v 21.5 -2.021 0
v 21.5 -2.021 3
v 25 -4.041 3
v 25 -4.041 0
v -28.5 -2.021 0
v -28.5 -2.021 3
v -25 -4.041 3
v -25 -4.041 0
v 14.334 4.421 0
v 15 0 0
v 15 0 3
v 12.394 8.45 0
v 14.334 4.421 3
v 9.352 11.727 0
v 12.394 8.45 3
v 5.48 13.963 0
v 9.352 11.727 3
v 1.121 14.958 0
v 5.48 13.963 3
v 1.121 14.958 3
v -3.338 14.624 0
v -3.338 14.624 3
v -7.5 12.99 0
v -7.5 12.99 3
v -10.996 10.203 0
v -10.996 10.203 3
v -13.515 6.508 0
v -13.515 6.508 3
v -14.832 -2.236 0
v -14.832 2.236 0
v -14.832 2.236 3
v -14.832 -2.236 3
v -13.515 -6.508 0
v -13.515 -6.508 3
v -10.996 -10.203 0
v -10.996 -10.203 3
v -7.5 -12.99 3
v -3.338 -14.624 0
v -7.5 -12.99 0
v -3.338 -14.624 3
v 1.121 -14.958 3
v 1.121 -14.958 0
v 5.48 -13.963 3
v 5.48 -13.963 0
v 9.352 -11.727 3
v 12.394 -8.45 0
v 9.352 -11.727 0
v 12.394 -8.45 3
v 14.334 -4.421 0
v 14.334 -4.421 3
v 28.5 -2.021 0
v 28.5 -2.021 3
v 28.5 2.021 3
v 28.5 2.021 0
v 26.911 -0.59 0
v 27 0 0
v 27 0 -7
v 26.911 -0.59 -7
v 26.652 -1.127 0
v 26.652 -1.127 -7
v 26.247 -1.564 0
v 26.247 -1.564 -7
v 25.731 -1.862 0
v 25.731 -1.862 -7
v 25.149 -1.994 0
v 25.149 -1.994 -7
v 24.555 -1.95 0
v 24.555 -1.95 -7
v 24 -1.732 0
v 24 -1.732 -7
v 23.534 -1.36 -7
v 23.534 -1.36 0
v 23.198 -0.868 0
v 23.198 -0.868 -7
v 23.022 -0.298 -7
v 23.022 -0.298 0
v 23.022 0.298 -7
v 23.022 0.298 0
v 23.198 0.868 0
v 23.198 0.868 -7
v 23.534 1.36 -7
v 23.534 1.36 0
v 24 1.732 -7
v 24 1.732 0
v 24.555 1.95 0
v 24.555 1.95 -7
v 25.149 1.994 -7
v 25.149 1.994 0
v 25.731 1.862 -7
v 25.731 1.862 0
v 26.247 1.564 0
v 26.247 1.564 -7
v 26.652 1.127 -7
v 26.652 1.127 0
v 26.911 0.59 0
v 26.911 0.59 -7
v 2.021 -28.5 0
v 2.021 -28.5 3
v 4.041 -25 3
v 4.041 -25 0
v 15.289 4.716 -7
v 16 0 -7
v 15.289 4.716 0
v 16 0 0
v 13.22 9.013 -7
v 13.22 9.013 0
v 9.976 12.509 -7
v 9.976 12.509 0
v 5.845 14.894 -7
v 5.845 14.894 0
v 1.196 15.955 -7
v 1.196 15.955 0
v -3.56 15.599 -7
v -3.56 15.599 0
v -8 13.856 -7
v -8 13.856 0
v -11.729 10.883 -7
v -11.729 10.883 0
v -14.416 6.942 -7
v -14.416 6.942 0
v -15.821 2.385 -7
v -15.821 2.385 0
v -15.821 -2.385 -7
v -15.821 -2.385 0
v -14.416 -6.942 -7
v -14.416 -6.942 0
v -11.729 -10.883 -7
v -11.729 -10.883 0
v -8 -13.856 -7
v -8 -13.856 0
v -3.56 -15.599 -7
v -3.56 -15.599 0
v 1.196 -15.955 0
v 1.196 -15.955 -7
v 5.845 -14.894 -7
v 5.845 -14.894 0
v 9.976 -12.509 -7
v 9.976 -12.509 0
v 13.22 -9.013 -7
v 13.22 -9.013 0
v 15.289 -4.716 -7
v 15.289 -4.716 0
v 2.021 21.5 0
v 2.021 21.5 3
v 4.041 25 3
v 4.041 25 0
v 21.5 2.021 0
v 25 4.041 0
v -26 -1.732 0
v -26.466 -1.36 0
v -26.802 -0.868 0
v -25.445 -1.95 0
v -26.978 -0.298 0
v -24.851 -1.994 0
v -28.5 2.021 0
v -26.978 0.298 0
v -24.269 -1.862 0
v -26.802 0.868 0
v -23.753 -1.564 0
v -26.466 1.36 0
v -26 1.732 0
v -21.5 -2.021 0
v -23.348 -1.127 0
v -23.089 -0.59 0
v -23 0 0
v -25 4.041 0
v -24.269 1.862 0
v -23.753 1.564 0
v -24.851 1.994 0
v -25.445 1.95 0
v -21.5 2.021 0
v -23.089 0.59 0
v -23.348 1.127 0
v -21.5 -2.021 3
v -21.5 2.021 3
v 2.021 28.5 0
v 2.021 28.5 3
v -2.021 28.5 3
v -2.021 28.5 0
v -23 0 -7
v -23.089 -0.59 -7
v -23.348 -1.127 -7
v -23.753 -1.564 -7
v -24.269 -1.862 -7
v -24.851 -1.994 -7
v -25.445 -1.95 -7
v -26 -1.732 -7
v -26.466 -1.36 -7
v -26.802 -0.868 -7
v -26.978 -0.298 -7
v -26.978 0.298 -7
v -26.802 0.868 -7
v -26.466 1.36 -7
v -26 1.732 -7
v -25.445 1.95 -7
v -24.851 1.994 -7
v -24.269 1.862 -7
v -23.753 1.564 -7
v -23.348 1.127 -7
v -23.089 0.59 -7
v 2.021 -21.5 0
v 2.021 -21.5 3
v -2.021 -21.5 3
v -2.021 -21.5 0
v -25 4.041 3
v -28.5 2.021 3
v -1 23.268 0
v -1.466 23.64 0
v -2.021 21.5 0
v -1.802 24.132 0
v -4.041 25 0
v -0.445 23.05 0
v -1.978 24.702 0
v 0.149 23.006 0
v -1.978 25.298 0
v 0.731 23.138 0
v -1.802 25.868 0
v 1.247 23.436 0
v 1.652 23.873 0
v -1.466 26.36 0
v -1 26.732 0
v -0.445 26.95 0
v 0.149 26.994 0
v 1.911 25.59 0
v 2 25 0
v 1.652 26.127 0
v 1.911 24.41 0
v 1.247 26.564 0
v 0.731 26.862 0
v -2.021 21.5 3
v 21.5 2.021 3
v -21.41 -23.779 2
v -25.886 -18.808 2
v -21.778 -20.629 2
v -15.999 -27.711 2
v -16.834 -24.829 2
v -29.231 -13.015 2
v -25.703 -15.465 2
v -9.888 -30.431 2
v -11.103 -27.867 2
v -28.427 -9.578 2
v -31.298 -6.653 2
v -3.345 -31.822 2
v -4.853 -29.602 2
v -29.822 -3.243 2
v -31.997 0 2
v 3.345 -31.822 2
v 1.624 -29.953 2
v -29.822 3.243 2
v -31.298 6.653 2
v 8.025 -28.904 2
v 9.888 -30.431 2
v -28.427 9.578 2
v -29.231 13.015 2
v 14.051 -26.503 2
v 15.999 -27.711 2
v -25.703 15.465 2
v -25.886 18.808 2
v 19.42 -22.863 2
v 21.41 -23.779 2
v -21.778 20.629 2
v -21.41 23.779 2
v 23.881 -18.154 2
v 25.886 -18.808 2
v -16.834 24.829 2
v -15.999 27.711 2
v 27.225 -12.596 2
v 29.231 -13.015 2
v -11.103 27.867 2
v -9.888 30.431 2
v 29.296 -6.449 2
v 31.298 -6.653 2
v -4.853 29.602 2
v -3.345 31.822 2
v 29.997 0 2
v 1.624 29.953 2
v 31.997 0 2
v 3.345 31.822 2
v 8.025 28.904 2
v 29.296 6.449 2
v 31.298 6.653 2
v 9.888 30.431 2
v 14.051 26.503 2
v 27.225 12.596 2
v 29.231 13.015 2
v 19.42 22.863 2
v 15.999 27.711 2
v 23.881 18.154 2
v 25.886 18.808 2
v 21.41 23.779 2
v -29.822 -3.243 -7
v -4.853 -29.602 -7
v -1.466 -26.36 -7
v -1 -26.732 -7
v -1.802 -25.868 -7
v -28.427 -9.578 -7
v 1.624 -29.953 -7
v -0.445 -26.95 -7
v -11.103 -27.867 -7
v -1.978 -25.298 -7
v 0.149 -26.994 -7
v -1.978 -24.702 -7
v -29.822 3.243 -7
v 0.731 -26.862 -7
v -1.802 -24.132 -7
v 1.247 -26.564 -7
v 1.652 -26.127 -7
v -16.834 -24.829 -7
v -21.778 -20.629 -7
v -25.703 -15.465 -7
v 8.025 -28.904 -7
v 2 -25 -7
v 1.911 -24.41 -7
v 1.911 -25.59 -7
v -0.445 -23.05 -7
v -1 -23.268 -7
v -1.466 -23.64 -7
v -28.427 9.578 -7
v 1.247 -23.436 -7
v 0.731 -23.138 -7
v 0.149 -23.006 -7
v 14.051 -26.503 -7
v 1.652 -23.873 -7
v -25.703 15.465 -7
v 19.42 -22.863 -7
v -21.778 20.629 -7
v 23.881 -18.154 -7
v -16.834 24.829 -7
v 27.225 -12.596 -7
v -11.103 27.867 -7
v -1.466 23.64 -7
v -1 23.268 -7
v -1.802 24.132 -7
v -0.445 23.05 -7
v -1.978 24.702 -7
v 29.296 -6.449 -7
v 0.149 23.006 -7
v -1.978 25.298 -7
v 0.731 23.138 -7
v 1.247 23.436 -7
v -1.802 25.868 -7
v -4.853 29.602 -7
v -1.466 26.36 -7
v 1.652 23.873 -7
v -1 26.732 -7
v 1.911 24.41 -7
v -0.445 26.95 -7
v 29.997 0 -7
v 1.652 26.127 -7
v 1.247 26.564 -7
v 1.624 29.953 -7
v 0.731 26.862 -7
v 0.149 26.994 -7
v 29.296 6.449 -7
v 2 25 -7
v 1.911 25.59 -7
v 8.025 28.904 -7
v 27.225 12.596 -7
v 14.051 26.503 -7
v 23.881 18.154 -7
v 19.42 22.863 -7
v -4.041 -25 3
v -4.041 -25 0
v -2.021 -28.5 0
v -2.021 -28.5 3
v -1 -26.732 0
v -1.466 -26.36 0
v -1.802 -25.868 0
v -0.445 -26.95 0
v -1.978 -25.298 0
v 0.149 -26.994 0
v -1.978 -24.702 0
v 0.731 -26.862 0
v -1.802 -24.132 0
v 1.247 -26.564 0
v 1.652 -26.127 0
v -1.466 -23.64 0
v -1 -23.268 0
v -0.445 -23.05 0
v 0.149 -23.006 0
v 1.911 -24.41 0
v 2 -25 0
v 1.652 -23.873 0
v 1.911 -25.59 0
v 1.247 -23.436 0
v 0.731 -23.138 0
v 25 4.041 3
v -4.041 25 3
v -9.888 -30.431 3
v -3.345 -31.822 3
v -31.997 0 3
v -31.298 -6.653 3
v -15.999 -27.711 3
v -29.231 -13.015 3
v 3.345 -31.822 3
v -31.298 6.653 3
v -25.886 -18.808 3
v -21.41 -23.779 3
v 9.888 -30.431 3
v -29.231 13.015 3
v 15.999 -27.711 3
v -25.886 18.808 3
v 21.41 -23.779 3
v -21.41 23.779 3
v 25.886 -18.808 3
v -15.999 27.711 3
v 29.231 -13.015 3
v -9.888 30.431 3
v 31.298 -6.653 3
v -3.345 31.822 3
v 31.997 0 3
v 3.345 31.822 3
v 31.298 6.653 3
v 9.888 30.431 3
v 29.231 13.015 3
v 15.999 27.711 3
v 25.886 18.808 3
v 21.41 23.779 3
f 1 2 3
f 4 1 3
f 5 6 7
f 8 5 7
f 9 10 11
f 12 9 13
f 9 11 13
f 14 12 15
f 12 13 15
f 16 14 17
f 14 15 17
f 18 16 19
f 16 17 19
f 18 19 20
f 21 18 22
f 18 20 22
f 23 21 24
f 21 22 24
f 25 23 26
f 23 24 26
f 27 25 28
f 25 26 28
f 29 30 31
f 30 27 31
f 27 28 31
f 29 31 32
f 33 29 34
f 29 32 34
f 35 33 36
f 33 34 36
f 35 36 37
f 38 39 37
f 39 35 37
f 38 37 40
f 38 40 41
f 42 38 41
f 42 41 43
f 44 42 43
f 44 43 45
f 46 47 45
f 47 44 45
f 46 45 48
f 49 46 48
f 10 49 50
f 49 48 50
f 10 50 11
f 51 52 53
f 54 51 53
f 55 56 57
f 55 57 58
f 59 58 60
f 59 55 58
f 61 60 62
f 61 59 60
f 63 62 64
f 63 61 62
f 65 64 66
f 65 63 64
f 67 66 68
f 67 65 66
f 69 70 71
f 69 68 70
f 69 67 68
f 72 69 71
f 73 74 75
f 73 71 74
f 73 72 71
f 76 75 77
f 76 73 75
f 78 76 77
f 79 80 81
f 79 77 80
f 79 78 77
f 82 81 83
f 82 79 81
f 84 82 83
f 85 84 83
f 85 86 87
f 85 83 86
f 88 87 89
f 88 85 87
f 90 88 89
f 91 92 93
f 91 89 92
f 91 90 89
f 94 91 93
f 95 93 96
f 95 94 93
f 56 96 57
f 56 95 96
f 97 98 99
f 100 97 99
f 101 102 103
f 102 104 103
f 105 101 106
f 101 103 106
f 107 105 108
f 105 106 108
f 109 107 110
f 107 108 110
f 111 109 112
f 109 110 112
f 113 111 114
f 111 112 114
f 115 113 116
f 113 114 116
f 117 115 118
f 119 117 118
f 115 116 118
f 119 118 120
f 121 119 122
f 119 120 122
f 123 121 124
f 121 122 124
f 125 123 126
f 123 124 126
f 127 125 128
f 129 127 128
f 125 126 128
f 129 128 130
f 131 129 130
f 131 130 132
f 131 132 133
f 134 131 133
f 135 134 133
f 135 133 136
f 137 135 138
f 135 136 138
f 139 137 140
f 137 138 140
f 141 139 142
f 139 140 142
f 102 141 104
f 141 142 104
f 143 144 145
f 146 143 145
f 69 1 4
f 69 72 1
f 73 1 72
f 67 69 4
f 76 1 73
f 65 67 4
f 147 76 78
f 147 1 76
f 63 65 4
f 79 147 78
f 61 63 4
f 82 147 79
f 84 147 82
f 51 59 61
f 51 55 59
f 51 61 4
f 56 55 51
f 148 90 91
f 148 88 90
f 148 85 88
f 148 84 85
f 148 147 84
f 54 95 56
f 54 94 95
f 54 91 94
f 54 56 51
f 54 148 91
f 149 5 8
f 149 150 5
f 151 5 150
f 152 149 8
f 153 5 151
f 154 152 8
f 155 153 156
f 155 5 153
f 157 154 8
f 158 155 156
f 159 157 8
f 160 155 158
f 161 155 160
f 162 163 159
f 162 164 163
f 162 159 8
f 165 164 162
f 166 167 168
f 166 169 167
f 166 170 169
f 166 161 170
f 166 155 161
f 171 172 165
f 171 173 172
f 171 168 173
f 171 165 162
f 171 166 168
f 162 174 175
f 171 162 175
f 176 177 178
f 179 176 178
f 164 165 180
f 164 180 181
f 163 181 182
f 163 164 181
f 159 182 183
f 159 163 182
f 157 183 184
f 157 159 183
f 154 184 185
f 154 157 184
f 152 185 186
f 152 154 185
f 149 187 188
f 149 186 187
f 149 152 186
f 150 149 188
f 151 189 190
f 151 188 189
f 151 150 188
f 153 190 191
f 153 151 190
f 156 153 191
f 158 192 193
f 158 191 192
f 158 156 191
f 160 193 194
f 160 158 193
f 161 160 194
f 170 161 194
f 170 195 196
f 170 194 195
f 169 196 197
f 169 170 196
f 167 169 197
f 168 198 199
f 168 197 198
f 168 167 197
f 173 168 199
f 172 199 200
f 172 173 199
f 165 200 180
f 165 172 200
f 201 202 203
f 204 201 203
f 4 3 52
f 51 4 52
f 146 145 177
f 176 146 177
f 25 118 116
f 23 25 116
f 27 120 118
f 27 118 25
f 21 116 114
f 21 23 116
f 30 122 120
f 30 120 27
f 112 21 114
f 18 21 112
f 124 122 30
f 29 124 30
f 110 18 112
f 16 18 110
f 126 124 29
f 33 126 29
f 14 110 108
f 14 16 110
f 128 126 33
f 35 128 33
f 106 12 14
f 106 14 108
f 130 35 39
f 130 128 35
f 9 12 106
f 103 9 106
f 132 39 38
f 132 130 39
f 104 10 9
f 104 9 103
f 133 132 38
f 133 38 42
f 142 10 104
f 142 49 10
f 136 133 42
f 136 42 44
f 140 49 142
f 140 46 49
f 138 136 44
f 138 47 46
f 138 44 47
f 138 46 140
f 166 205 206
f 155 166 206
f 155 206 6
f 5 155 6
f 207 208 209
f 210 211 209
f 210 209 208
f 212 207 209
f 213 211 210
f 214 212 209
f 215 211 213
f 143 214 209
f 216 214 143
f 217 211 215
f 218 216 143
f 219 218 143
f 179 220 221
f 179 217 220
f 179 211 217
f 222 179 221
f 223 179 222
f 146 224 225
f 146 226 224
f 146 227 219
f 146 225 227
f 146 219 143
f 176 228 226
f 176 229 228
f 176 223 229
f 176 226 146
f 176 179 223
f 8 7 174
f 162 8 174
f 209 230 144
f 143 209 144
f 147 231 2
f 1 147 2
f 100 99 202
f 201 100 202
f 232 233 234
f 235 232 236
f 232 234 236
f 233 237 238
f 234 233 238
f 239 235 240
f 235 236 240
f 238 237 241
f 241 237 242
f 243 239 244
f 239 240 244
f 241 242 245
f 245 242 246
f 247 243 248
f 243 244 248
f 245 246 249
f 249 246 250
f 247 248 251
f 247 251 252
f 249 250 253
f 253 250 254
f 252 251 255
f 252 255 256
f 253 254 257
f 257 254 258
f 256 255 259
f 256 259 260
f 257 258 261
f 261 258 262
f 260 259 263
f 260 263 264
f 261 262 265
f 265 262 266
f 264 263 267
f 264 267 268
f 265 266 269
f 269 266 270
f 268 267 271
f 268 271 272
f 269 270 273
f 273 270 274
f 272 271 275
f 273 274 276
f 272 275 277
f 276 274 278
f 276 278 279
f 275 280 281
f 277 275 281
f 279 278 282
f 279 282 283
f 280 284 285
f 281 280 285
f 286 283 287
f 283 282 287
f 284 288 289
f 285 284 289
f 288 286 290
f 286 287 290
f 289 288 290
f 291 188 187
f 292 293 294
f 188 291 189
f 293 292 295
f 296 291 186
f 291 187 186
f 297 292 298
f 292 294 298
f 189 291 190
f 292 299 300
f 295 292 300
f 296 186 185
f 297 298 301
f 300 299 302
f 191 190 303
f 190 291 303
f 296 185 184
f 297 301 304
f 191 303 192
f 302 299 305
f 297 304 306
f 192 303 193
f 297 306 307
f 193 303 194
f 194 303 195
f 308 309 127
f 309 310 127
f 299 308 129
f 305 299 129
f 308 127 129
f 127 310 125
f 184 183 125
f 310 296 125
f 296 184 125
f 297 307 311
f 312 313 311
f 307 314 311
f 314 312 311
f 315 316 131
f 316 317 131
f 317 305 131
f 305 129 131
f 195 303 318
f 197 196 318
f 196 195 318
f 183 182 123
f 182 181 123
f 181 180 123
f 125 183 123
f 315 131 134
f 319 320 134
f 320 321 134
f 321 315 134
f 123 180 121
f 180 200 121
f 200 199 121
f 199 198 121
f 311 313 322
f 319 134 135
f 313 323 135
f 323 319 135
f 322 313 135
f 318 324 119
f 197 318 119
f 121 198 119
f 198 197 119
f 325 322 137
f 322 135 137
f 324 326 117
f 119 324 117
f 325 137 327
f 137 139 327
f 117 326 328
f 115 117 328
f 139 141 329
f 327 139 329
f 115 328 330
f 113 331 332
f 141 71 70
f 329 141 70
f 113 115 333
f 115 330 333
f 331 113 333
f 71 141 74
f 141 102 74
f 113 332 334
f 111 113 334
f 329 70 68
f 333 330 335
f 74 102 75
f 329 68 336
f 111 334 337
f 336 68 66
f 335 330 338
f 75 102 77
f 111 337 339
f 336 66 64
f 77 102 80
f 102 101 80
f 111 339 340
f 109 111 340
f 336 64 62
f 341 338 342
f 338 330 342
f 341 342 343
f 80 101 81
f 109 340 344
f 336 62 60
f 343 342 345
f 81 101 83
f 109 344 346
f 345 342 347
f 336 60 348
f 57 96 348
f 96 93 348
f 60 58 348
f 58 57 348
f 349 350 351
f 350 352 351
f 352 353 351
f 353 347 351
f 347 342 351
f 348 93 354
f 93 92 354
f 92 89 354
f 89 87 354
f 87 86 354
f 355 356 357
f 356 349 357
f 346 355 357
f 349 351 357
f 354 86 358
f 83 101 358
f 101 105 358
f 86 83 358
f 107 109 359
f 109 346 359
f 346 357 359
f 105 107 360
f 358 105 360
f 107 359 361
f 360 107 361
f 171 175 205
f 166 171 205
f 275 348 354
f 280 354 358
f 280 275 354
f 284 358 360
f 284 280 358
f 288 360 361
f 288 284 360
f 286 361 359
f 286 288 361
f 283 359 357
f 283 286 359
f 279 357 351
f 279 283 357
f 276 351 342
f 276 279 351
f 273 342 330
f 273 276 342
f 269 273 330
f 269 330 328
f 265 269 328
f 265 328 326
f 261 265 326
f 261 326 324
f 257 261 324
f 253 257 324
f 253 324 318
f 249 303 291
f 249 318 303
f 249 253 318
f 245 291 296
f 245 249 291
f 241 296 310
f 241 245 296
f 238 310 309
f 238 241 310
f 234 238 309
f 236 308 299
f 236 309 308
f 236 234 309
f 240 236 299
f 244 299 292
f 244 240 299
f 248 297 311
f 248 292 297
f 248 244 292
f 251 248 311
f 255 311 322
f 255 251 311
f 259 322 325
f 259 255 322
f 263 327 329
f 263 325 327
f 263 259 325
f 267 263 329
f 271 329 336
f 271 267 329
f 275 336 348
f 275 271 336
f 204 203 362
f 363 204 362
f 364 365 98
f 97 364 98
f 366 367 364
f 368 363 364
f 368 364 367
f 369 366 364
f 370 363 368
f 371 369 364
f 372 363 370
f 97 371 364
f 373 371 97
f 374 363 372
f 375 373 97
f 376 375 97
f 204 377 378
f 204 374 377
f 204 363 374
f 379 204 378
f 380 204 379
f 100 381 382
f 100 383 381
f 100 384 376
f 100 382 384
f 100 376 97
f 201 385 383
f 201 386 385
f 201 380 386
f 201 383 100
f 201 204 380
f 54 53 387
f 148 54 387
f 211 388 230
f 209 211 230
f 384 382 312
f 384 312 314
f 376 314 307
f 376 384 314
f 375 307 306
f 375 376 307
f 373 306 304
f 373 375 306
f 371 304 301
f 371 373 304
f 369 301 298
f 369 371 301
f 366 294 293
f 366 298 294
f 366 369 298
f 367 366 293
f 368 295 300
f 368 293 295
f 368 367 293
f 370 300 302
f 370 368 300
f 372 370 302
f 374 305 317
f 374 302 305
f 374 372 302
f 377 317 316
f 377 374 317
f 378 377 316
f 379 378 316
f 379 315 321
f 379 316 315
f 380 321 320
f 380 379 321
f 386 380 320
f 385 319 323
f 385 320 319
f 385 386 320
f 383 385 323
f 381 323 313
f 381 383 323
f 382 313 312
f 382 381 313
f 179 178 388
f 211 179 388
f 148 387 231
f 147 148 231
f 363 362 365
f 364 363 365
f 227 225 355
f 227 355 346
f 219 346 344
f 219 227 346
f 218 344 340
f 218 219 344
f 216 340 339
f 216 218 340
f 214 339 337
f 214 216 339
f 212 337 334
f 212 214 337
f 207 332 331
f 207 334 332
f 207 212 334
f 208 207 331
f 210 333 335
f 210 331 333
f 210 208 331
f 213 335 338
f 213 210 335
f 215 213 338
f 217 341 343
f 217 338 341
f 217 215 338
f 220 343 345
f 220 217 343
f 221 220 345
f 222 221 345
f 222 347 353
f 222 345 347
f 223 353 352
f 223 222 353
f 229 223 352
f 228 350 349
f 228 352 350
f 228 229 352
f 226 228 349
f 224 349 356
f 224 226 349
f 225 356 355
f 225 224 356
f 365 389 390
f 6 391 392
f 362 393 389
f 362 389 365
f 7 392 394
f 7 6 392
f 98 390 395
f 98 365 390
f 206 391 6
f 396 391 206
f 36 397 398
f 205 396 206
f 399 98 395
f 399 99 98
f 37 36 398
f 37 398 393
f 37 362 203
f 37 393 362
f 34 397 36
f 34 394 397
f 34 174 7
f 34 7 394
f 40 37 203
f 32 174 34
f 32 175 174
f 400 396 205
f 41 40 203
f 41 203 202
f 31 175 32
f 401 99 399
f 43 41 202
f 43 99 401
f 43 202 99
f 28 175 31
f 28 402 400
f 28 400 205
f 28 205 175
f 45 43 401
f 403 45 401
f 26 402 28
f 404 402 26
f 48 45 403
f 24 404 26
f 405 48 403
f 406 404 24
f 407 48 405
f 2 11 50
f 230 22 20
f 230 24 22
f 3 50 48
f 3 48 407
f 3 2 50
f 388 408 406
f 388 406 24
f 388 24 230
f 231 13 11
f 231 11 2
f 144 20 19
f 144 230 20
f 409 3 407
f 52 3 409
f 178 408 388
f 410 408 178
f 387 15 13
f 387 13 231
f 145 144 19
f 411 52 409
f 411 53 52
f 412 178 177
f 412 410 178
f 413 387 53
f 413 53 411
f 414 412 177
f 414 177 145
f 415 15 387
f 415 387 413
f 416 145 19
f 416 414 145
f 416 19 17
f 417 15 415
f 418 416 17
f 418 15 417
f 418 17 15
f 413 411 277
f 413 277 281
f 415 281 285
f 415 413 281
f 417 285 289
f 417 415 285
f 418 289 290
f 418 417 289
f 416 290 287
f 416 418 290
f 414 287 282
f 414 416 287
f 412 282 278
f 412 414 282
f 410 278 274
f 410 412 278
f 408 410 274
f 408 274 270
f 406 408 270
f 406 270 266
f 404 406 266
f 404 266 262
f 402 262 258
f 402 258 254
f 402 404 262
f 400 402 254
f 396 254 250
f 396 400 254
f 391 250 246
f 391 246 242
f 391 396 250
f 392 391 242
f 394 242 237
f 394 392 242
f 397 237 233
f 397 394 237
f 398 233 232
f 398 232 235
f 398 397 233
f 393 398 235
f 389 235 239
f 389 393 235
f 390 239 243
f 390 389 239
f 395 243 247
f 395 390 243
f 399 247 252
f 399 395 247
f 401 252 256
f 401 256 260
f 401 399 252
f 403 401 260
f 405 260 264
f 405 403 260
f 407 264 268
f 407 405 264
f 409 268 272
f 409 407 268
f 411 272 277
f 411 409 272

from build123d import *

# Parameters (mm, degrees)
SKETCH1_R           = 29.9974
SKETCH1_R_2         = 16
BOSS_EXTRUDE1_DEPTH = 7
SKETCH2_R           = 2
CUT_EXTRUDE1_DEPTH  = 10
SKETCH3_R           = 16
SKETCH3_R_2         = 15
BOSS_EXTRUDE2_DEPTH = 1
BOSS_EXTRUDE3_START = 3
SKETCH1_3_R         = 29.9974
SKETCH1_3_R_2       = 16
BOSS_EXTRUDE3_DEPTH = 3
BOSS_EXTRUDE4_START = 2
SKETCH3_2_R         = 16
SKETCH3_2_R_2       = 15
BOSS_EXTRUDE4_DEPTH = 2
SKETCH4_R           = 31.9974
SKETCH4_R_2         = 29.9974
BOSS_EXTRUDE5_DEPTH = 1
CUT_EXTRUDE3_START  = -1
SKETCH5_R           = 16
SKETCH5_R_2         = 15
CUT_EXTRUDE3_DEPTH  = 1
SKETCH6_R           = 3
SKETCH6_R_2         = 2
BOSS_EXTRUDE6_DEPTH = 3
CHAMFER1_SIZE       = 3
CUT_EXTRUDE4_START  = -10
SKETCH7_R           = 2
CUT_EXTRUDE4_DEPTH  = 10
BOSS_EXTRUDE7_START = 1
SKETCH8_R           = 16
SKETCH8_R_2         = 15
BOSS_EXTRUDE7_DEPTH = 1
CUT_EXTRUDE6_DEPTH  = 3


# Read off the part's stored shape, not the designer's step: Cut-Extrude5
with BuildPart() as part:
    # Sketch1 → Boss-Extrude1 (new body)
    with BuildSketch(Plane.XY):
        Circle(SKETCH1_R)
        Circle(SKETCH1_R_2, mode=Mode.SUBTRACT)
    extrude(amount=-BOSS_EXTRUDE1_DEPTH)

    # Sketch2 → Cut-Extrude1 (cut)
    with BuildSketch(Plane.XY):
        with Locations((25, 0)):
            Circle(SKETCH2_R)
        with Locations((0, -25)):
            Circle(SKETCH2_R)
        with Locations((-25, 0)):
            Circle(SKETCH2_R)
        with Locations((0, 25)):
            Circle(SKETCH2_R)
    extrude(amount=-CUT_EXTRUDE1_DEPTH, mode=Mode.SUBTRACT)

    # Sketch3 → Boss-Extrude2 (add)
    with BuildSketch(Plane.XY):
        Circle(SKETCH3_R)
        Circle(SKETCH3_R_2, mode=Mode.SUBTRACT)
    extrude(amount=-BOSS_EXTRUDE2_DEPTH)

    # Sketch1<3> → Boss-Extrude3 (add)
    with BuildSketch(Plane.XY.offset(BOSS_EXTRUDE3_START)):
        Circle(SKETCH1_3_R)
        Circle(SKETCH1_3_R_2, mode=Mode.SUBTRACT)
    extrude(amount=-BOSS_EXTRUDE3_DEPTH)

    # Sketch3<2> → Boss-Extrude4 (add)
    with BuildSketch(Plane.XY.offset(BOSS_EXTRUDE4_START)):
        Circle(SKETCH3_2_R)
        Circle(SKETCH3_2_R_2, mode=Mode.SUBTRACT)
    extrude(amount=-BOSS_EXTRUDE4_DEPTH)

    # Sketch4 → Boss-Extrude5 (add)
    with BuildSketch(Plane.XY.offset(3)):
        Circle(SKETCH4_R)
        Circle(SKETCH4_R_2, mode=Mode.SUBTRACT)
    extrude(amount=-BOSS_EXTRUDE5_DEPTH)

    # Sketch5 → Cut-Extrude3 (cut)
    with BuildSketch(Plane(origin=(0, 0, -1), x_dir=(-1, 0, 0), z_dir=(0, 0, -1)).offset(CUT_EXTRUDE3_START)):
        with Locations(Location((0, 0, 0), (0, 0, 180))):
            Circle(SKETCH5_R)
        with Locations(Location((0, 0, 0), (0, 0, 180))):
            Circle(SKETCH5_R_2, mode=Mode.SUBTRACT)
    extrude(amount=CUT_EXTRUDE3_DEPTH, mode=Mode.SUBTRACT)

    # Sketch6 → Boss-Extrude6 (add)
    # profile 1 of 4: a face of its own
    with BuildSketch(Plane(origin=(0, 0, -7), x_dir=(-1, 0, 0), z_dir=(0, 0, -1))):
        with Locations(Location((-25, 0, 0), (0, 0, 180))):
            Circle(SKETCH6_R)
        with Locations(Location((-25, 0, 0), (0, 0, 180))):
            Circle(SKETCH6_R_2, mode=Mode.SUBTRACT)
    # profile 2 of 4: a face of its own
    with BuildSketch(Plane(origin=(0, 0, -7), x_dir=(-1, 0, 0), z_dir=(0, 0, -1))):
        with Locations(Location((0, -25, 0), (0, 0, 180))):
            Circle(SKETCH6_R)
        with Locations(Location((0, -25, 0), (0, 0, 180))):
            Circle(SKETCH6_R_2, mode=Mode.SUBTRACT)
    # profile 3 of 4: a face of its own
    with BuildSketch(Plane(origin=(0, 0, -7), x_dir=(-1, 0, 0), z_dir=(0, 0, -1))):
        with Locations(Location((25, 0, 0), (0, 0, 180))):
            Circle(SKETCH6_R)
        with Locations(Location((25, 0, 0), (0, 0, 180))):
            Circle(SKETCH6_R_2, mode=Mode.SUBTRACT)
    # profile 4 of 4: a face of its own
    with BuildSketch(Plane(origin=(0, 0, -7), x_dir=(-1, 0, 0), z_dir=(0, 0, -1))):
        with Locations(Location((0, 25, 0), (0, 0, 180))):
            Circle(SKETCH6_R)
        with Locations(Location((0, 25, 0), (0, 0, 180))):
            Circle(SKETCH6_R_2, mode=Mode.SUBTRACT)
    extrude(amount=BOSS_EXTRUDE6_DEPTH)

    # Chamfer1
    # the kernel refuses this chamfer: 3 mm, written as the material it adds along each edge
    with BuildSketch(Plane(origin=(25, 0, -7), x_dir=(1, 0, 0), z_dir=(0, 1, 0))) as chamfer1_piece_1_section:
        Polygon((3 + CHAMFER1_SIZE, 0), (3, CHAMFER1_SIZE), (3, 0), align=None)
    chamfer1_piece_1 = revolve(axis=Axis((25, 0, -7), (0, 0, -1)), mode=Mode.PRIVATE)
    chamfer1_piece_1 = chamfer1_piece_1 & Plane(origin=(0, 0, -8.42256149), x_dir=(1, 0, 0), z_dir=(0, 0, 1)) * Cylinder(29.9974, 25, mode=Mode.PRIVATE)
    chamfer1_piece_1 = split(chamfer1_piece_1, bisect_by=Plane(origin=(20.492585696, 0, -10), z_dir=(0, 0, 1)), keep=Keep.TOP, mode=Mode.PRIVATE)
    add(chamfer1_piece_1)
    with BuildSketch(Plane(origin=(0, -25, -7), x_dir=(1, 0, 0), z_dir=(0, 1, 0))) as chamfer1_piece_2_section:
        Polygon((3 + CHAMFER1_SIZE, 0), (3, CHAMFER1_SIZE), (3, 0), align=None)
    chamfer1_piece_2 = revolve(axis=Axis((0, -25, -7), (0, 0, -1)), mode=Mode.PRIVATE)
    chamfer1_piece_2 = chamfer1_piece_2 & Plane(origin=(0, 0, -8.422561428), x_dir=(1, 0, 0), z_dir=(0, 0, 1)) * Cylinder(29.9974, 25, mode=Mode.PRIVATE)
    chamfer1_piece_2 = split(chamfer1_piece_2, bisect_by=Plane(origin=(-4.507414242, -25, -10), z_dir=(0, 0, 1)), keep=Keep.TOP, mode=Mode.PRIVATE)
    add(chamfer1_piece_2)
    with BuildSketch(Plane(origin=(-25, 0, -7), x_dir=(1, 0, 0), z_dir=(0, 1, 0))) as chamfer1_piece_3_section:
        Polygon((3 + CHAMFER1_SIZE, 0), (3, CHAMFER1_SIZE), (3, 0), align=None)
    chamfer1_piece_3 = revolve(axis=Axis((-25, 0, -7), (0, 0, -1)), mode=Mode.PRIVATE)
    chamfer1_piece_3 = chamfer1_piece_3 & Plane(origin=(0, 0, -8.422561427), x_dir=(1, 0, 0), z_dir=(0, 0, 1)) * Cylinder(29.9974, 25, mode=Mode.PRIVATE)
    chamfer1_piece_3 = split(chamfer1_piece_3, bisect_by=Plane(origin=(-29.507414241, 0, -10), z_dir=(0, 0, 1)), keep=Keep.TOP, mode=Mode.PRIVATE)
    add(chamfer1_piece_3)
    with BuildSketch(Plane(origin=(0, 25, -7), x_dir=(1, 0, 0), z_dir=(0, 1, 0))) as chamfer1_piece_4_section:
        Polygon((3 + CHAMFER1_SIZE, 0), (3, CHAMFER1_SIZE), (3, 0), align=None)
    chamfer1_piece_4 = revolve(axis=Axis((0, 25, -7), (0, 0, -1)), mode=Mode.PRIVATE)
    chamfer1_piece_4 = chamfer1_piece_4 & Plane(origin=(0, 0, -8.422561436), x_dir=(1, 0, 0), z_dir=(0, 0, 1)) * Cylinder(29.9974, 25, mode=Mode.PRIVATE)
    chamfer1_piece_4 = split(chamfer1_piece_4, bisect_by=Plane(origin=(-4.50741425, 25, -10), z_dir=(0, 0, 1)), keep=Keep.TOP, mode=Mode.PRIVATE)
    add(chamfer1_piece_4)

    # Sketch7 → Cut-Extrude4 (cut)
    with BuildSketch(Plane(origin=(0, 0, 0), x_dir=(-1, 0, 0), z_dir=(0, 0, -1)).offset(CUT_EXTRUDE4_START)):
        with Locations(Location((-25, 0, 0), (0, 0, 180))):
            Circle(SKETCH7_R)
        with Locations(Location((0, 25, 0), (0, 0, 180))):
            Circle(SKETCH7_R)
        with Locations(Location((25, 0, 0), (0, 0, 180))):
            Circle(SKETCH7_R)
        with Locations(Location((0, -25, 0), (0, 0, 180))):
            Circle(SKETCH7_R)
    extrude(amount=CUT_EXTRUDE4_DEPTH, mode=Mode.SUBTRACT)

    # Sketch8 → Boss-Extrude7 (add)
    with BuildSketch(Plane.XY.offset(2).offset(BOSS_EXTRUDE7_START)):
        Circle(SKETCH8_R)
        Circle(SKETCH8_R_2, mode=Mode.SUBTRACT)
    extrude(amount=-BOSS_EXTRUDE7_DEPTH)

    # Cut-Extrude5 outline → Cut-Extrude5 (revolve, cut)
    with BuildSketch(Plane(origin=(25, 0, 0), x_dir=(1, 0, 0), z_dir=(0, -1, 0))):
        Polygon((2, -7), (2, -10), (3, -10), (6, -7), align=None)
    revolve(axis=Axis((25, 0, 0), (0, 0, 1)), mode=Mode.SUBTRACT)

    # Cut-Extrude5 2 outline → Cut-Extrude5 2 (revolve, cut)
    with BuildSketch(Plane.XZ.offset(25)):
        Polygon((2, -7), (2, -10), (3, -10), (6, -7), align=None)
    revolve(axis=Axis((0, -25, 0), (0, 0, 1)), mode=Mode.SUBTRACT)

    # Cut-Extrude5 3 outline → Cut-Extrude5 3 (revolve, cut)
    with BuildSketch(Plane(origin=(-25, 0, 0), x_dir=(1, 0, 0), z_dir=(0, -1, 0))):
        Polygon((2, -7), (2, -10), (3, -10), (6, -7), align=None)
    revolve(axis=Axis((-25, 0, 0), (0, 0, 1)), mode=Mode.SUBTRACT)

    # Cut-Extrude5 4 outline → Cut-Extrude5 4 (revolve, cut)
    with BuildSketch(Plane.XZ.offset(-25)):
        Polygon((2, -7), (2, -10), (3, -10), (6, -7), align=None)
    revolve(axis=Axis((0, 25, 0), (0, 0, 1)), mode=Mode.SUBTRACT)

    # Sketch10 → Cut-Extrude6 (cut)
    with BuildSketch(Plane.XY.offset(3)):
        Polygon((-4.041451884, -25), (-2.020725942, -28.5), (2.020725942, -28.5), (4.041451884, -25), (2.020725942, -21.5), (-2.020725942, -21.5), align=None)
        Polygon((25, -4.041451884), (28.5, -2.020725942), (28.5, 2.020725942), (25, 4.041451884), (21.5, 2.020725942), (21.5, -2.020725942), align=None)
        Polygon((-25, 4.041451884), (-28.5, 2.020725942), (-28.5, -2.020725942), (-25, -4.041451884), (-21.5, -2.020725942), (-21.5, 2.020725942), align=None)
        Polygon((4.041451884, 25), (2.020725942, 28.5), (-2.020725942, 28.5), (-4.041451884, 25), (-2.020725942, 21.5), (2.020725942, 21.5), align=None)
    extrude(amount=-CUT_EXTRUDE6_DEPTH, mode=Mode.SUBTRACT)


solid = part.part
